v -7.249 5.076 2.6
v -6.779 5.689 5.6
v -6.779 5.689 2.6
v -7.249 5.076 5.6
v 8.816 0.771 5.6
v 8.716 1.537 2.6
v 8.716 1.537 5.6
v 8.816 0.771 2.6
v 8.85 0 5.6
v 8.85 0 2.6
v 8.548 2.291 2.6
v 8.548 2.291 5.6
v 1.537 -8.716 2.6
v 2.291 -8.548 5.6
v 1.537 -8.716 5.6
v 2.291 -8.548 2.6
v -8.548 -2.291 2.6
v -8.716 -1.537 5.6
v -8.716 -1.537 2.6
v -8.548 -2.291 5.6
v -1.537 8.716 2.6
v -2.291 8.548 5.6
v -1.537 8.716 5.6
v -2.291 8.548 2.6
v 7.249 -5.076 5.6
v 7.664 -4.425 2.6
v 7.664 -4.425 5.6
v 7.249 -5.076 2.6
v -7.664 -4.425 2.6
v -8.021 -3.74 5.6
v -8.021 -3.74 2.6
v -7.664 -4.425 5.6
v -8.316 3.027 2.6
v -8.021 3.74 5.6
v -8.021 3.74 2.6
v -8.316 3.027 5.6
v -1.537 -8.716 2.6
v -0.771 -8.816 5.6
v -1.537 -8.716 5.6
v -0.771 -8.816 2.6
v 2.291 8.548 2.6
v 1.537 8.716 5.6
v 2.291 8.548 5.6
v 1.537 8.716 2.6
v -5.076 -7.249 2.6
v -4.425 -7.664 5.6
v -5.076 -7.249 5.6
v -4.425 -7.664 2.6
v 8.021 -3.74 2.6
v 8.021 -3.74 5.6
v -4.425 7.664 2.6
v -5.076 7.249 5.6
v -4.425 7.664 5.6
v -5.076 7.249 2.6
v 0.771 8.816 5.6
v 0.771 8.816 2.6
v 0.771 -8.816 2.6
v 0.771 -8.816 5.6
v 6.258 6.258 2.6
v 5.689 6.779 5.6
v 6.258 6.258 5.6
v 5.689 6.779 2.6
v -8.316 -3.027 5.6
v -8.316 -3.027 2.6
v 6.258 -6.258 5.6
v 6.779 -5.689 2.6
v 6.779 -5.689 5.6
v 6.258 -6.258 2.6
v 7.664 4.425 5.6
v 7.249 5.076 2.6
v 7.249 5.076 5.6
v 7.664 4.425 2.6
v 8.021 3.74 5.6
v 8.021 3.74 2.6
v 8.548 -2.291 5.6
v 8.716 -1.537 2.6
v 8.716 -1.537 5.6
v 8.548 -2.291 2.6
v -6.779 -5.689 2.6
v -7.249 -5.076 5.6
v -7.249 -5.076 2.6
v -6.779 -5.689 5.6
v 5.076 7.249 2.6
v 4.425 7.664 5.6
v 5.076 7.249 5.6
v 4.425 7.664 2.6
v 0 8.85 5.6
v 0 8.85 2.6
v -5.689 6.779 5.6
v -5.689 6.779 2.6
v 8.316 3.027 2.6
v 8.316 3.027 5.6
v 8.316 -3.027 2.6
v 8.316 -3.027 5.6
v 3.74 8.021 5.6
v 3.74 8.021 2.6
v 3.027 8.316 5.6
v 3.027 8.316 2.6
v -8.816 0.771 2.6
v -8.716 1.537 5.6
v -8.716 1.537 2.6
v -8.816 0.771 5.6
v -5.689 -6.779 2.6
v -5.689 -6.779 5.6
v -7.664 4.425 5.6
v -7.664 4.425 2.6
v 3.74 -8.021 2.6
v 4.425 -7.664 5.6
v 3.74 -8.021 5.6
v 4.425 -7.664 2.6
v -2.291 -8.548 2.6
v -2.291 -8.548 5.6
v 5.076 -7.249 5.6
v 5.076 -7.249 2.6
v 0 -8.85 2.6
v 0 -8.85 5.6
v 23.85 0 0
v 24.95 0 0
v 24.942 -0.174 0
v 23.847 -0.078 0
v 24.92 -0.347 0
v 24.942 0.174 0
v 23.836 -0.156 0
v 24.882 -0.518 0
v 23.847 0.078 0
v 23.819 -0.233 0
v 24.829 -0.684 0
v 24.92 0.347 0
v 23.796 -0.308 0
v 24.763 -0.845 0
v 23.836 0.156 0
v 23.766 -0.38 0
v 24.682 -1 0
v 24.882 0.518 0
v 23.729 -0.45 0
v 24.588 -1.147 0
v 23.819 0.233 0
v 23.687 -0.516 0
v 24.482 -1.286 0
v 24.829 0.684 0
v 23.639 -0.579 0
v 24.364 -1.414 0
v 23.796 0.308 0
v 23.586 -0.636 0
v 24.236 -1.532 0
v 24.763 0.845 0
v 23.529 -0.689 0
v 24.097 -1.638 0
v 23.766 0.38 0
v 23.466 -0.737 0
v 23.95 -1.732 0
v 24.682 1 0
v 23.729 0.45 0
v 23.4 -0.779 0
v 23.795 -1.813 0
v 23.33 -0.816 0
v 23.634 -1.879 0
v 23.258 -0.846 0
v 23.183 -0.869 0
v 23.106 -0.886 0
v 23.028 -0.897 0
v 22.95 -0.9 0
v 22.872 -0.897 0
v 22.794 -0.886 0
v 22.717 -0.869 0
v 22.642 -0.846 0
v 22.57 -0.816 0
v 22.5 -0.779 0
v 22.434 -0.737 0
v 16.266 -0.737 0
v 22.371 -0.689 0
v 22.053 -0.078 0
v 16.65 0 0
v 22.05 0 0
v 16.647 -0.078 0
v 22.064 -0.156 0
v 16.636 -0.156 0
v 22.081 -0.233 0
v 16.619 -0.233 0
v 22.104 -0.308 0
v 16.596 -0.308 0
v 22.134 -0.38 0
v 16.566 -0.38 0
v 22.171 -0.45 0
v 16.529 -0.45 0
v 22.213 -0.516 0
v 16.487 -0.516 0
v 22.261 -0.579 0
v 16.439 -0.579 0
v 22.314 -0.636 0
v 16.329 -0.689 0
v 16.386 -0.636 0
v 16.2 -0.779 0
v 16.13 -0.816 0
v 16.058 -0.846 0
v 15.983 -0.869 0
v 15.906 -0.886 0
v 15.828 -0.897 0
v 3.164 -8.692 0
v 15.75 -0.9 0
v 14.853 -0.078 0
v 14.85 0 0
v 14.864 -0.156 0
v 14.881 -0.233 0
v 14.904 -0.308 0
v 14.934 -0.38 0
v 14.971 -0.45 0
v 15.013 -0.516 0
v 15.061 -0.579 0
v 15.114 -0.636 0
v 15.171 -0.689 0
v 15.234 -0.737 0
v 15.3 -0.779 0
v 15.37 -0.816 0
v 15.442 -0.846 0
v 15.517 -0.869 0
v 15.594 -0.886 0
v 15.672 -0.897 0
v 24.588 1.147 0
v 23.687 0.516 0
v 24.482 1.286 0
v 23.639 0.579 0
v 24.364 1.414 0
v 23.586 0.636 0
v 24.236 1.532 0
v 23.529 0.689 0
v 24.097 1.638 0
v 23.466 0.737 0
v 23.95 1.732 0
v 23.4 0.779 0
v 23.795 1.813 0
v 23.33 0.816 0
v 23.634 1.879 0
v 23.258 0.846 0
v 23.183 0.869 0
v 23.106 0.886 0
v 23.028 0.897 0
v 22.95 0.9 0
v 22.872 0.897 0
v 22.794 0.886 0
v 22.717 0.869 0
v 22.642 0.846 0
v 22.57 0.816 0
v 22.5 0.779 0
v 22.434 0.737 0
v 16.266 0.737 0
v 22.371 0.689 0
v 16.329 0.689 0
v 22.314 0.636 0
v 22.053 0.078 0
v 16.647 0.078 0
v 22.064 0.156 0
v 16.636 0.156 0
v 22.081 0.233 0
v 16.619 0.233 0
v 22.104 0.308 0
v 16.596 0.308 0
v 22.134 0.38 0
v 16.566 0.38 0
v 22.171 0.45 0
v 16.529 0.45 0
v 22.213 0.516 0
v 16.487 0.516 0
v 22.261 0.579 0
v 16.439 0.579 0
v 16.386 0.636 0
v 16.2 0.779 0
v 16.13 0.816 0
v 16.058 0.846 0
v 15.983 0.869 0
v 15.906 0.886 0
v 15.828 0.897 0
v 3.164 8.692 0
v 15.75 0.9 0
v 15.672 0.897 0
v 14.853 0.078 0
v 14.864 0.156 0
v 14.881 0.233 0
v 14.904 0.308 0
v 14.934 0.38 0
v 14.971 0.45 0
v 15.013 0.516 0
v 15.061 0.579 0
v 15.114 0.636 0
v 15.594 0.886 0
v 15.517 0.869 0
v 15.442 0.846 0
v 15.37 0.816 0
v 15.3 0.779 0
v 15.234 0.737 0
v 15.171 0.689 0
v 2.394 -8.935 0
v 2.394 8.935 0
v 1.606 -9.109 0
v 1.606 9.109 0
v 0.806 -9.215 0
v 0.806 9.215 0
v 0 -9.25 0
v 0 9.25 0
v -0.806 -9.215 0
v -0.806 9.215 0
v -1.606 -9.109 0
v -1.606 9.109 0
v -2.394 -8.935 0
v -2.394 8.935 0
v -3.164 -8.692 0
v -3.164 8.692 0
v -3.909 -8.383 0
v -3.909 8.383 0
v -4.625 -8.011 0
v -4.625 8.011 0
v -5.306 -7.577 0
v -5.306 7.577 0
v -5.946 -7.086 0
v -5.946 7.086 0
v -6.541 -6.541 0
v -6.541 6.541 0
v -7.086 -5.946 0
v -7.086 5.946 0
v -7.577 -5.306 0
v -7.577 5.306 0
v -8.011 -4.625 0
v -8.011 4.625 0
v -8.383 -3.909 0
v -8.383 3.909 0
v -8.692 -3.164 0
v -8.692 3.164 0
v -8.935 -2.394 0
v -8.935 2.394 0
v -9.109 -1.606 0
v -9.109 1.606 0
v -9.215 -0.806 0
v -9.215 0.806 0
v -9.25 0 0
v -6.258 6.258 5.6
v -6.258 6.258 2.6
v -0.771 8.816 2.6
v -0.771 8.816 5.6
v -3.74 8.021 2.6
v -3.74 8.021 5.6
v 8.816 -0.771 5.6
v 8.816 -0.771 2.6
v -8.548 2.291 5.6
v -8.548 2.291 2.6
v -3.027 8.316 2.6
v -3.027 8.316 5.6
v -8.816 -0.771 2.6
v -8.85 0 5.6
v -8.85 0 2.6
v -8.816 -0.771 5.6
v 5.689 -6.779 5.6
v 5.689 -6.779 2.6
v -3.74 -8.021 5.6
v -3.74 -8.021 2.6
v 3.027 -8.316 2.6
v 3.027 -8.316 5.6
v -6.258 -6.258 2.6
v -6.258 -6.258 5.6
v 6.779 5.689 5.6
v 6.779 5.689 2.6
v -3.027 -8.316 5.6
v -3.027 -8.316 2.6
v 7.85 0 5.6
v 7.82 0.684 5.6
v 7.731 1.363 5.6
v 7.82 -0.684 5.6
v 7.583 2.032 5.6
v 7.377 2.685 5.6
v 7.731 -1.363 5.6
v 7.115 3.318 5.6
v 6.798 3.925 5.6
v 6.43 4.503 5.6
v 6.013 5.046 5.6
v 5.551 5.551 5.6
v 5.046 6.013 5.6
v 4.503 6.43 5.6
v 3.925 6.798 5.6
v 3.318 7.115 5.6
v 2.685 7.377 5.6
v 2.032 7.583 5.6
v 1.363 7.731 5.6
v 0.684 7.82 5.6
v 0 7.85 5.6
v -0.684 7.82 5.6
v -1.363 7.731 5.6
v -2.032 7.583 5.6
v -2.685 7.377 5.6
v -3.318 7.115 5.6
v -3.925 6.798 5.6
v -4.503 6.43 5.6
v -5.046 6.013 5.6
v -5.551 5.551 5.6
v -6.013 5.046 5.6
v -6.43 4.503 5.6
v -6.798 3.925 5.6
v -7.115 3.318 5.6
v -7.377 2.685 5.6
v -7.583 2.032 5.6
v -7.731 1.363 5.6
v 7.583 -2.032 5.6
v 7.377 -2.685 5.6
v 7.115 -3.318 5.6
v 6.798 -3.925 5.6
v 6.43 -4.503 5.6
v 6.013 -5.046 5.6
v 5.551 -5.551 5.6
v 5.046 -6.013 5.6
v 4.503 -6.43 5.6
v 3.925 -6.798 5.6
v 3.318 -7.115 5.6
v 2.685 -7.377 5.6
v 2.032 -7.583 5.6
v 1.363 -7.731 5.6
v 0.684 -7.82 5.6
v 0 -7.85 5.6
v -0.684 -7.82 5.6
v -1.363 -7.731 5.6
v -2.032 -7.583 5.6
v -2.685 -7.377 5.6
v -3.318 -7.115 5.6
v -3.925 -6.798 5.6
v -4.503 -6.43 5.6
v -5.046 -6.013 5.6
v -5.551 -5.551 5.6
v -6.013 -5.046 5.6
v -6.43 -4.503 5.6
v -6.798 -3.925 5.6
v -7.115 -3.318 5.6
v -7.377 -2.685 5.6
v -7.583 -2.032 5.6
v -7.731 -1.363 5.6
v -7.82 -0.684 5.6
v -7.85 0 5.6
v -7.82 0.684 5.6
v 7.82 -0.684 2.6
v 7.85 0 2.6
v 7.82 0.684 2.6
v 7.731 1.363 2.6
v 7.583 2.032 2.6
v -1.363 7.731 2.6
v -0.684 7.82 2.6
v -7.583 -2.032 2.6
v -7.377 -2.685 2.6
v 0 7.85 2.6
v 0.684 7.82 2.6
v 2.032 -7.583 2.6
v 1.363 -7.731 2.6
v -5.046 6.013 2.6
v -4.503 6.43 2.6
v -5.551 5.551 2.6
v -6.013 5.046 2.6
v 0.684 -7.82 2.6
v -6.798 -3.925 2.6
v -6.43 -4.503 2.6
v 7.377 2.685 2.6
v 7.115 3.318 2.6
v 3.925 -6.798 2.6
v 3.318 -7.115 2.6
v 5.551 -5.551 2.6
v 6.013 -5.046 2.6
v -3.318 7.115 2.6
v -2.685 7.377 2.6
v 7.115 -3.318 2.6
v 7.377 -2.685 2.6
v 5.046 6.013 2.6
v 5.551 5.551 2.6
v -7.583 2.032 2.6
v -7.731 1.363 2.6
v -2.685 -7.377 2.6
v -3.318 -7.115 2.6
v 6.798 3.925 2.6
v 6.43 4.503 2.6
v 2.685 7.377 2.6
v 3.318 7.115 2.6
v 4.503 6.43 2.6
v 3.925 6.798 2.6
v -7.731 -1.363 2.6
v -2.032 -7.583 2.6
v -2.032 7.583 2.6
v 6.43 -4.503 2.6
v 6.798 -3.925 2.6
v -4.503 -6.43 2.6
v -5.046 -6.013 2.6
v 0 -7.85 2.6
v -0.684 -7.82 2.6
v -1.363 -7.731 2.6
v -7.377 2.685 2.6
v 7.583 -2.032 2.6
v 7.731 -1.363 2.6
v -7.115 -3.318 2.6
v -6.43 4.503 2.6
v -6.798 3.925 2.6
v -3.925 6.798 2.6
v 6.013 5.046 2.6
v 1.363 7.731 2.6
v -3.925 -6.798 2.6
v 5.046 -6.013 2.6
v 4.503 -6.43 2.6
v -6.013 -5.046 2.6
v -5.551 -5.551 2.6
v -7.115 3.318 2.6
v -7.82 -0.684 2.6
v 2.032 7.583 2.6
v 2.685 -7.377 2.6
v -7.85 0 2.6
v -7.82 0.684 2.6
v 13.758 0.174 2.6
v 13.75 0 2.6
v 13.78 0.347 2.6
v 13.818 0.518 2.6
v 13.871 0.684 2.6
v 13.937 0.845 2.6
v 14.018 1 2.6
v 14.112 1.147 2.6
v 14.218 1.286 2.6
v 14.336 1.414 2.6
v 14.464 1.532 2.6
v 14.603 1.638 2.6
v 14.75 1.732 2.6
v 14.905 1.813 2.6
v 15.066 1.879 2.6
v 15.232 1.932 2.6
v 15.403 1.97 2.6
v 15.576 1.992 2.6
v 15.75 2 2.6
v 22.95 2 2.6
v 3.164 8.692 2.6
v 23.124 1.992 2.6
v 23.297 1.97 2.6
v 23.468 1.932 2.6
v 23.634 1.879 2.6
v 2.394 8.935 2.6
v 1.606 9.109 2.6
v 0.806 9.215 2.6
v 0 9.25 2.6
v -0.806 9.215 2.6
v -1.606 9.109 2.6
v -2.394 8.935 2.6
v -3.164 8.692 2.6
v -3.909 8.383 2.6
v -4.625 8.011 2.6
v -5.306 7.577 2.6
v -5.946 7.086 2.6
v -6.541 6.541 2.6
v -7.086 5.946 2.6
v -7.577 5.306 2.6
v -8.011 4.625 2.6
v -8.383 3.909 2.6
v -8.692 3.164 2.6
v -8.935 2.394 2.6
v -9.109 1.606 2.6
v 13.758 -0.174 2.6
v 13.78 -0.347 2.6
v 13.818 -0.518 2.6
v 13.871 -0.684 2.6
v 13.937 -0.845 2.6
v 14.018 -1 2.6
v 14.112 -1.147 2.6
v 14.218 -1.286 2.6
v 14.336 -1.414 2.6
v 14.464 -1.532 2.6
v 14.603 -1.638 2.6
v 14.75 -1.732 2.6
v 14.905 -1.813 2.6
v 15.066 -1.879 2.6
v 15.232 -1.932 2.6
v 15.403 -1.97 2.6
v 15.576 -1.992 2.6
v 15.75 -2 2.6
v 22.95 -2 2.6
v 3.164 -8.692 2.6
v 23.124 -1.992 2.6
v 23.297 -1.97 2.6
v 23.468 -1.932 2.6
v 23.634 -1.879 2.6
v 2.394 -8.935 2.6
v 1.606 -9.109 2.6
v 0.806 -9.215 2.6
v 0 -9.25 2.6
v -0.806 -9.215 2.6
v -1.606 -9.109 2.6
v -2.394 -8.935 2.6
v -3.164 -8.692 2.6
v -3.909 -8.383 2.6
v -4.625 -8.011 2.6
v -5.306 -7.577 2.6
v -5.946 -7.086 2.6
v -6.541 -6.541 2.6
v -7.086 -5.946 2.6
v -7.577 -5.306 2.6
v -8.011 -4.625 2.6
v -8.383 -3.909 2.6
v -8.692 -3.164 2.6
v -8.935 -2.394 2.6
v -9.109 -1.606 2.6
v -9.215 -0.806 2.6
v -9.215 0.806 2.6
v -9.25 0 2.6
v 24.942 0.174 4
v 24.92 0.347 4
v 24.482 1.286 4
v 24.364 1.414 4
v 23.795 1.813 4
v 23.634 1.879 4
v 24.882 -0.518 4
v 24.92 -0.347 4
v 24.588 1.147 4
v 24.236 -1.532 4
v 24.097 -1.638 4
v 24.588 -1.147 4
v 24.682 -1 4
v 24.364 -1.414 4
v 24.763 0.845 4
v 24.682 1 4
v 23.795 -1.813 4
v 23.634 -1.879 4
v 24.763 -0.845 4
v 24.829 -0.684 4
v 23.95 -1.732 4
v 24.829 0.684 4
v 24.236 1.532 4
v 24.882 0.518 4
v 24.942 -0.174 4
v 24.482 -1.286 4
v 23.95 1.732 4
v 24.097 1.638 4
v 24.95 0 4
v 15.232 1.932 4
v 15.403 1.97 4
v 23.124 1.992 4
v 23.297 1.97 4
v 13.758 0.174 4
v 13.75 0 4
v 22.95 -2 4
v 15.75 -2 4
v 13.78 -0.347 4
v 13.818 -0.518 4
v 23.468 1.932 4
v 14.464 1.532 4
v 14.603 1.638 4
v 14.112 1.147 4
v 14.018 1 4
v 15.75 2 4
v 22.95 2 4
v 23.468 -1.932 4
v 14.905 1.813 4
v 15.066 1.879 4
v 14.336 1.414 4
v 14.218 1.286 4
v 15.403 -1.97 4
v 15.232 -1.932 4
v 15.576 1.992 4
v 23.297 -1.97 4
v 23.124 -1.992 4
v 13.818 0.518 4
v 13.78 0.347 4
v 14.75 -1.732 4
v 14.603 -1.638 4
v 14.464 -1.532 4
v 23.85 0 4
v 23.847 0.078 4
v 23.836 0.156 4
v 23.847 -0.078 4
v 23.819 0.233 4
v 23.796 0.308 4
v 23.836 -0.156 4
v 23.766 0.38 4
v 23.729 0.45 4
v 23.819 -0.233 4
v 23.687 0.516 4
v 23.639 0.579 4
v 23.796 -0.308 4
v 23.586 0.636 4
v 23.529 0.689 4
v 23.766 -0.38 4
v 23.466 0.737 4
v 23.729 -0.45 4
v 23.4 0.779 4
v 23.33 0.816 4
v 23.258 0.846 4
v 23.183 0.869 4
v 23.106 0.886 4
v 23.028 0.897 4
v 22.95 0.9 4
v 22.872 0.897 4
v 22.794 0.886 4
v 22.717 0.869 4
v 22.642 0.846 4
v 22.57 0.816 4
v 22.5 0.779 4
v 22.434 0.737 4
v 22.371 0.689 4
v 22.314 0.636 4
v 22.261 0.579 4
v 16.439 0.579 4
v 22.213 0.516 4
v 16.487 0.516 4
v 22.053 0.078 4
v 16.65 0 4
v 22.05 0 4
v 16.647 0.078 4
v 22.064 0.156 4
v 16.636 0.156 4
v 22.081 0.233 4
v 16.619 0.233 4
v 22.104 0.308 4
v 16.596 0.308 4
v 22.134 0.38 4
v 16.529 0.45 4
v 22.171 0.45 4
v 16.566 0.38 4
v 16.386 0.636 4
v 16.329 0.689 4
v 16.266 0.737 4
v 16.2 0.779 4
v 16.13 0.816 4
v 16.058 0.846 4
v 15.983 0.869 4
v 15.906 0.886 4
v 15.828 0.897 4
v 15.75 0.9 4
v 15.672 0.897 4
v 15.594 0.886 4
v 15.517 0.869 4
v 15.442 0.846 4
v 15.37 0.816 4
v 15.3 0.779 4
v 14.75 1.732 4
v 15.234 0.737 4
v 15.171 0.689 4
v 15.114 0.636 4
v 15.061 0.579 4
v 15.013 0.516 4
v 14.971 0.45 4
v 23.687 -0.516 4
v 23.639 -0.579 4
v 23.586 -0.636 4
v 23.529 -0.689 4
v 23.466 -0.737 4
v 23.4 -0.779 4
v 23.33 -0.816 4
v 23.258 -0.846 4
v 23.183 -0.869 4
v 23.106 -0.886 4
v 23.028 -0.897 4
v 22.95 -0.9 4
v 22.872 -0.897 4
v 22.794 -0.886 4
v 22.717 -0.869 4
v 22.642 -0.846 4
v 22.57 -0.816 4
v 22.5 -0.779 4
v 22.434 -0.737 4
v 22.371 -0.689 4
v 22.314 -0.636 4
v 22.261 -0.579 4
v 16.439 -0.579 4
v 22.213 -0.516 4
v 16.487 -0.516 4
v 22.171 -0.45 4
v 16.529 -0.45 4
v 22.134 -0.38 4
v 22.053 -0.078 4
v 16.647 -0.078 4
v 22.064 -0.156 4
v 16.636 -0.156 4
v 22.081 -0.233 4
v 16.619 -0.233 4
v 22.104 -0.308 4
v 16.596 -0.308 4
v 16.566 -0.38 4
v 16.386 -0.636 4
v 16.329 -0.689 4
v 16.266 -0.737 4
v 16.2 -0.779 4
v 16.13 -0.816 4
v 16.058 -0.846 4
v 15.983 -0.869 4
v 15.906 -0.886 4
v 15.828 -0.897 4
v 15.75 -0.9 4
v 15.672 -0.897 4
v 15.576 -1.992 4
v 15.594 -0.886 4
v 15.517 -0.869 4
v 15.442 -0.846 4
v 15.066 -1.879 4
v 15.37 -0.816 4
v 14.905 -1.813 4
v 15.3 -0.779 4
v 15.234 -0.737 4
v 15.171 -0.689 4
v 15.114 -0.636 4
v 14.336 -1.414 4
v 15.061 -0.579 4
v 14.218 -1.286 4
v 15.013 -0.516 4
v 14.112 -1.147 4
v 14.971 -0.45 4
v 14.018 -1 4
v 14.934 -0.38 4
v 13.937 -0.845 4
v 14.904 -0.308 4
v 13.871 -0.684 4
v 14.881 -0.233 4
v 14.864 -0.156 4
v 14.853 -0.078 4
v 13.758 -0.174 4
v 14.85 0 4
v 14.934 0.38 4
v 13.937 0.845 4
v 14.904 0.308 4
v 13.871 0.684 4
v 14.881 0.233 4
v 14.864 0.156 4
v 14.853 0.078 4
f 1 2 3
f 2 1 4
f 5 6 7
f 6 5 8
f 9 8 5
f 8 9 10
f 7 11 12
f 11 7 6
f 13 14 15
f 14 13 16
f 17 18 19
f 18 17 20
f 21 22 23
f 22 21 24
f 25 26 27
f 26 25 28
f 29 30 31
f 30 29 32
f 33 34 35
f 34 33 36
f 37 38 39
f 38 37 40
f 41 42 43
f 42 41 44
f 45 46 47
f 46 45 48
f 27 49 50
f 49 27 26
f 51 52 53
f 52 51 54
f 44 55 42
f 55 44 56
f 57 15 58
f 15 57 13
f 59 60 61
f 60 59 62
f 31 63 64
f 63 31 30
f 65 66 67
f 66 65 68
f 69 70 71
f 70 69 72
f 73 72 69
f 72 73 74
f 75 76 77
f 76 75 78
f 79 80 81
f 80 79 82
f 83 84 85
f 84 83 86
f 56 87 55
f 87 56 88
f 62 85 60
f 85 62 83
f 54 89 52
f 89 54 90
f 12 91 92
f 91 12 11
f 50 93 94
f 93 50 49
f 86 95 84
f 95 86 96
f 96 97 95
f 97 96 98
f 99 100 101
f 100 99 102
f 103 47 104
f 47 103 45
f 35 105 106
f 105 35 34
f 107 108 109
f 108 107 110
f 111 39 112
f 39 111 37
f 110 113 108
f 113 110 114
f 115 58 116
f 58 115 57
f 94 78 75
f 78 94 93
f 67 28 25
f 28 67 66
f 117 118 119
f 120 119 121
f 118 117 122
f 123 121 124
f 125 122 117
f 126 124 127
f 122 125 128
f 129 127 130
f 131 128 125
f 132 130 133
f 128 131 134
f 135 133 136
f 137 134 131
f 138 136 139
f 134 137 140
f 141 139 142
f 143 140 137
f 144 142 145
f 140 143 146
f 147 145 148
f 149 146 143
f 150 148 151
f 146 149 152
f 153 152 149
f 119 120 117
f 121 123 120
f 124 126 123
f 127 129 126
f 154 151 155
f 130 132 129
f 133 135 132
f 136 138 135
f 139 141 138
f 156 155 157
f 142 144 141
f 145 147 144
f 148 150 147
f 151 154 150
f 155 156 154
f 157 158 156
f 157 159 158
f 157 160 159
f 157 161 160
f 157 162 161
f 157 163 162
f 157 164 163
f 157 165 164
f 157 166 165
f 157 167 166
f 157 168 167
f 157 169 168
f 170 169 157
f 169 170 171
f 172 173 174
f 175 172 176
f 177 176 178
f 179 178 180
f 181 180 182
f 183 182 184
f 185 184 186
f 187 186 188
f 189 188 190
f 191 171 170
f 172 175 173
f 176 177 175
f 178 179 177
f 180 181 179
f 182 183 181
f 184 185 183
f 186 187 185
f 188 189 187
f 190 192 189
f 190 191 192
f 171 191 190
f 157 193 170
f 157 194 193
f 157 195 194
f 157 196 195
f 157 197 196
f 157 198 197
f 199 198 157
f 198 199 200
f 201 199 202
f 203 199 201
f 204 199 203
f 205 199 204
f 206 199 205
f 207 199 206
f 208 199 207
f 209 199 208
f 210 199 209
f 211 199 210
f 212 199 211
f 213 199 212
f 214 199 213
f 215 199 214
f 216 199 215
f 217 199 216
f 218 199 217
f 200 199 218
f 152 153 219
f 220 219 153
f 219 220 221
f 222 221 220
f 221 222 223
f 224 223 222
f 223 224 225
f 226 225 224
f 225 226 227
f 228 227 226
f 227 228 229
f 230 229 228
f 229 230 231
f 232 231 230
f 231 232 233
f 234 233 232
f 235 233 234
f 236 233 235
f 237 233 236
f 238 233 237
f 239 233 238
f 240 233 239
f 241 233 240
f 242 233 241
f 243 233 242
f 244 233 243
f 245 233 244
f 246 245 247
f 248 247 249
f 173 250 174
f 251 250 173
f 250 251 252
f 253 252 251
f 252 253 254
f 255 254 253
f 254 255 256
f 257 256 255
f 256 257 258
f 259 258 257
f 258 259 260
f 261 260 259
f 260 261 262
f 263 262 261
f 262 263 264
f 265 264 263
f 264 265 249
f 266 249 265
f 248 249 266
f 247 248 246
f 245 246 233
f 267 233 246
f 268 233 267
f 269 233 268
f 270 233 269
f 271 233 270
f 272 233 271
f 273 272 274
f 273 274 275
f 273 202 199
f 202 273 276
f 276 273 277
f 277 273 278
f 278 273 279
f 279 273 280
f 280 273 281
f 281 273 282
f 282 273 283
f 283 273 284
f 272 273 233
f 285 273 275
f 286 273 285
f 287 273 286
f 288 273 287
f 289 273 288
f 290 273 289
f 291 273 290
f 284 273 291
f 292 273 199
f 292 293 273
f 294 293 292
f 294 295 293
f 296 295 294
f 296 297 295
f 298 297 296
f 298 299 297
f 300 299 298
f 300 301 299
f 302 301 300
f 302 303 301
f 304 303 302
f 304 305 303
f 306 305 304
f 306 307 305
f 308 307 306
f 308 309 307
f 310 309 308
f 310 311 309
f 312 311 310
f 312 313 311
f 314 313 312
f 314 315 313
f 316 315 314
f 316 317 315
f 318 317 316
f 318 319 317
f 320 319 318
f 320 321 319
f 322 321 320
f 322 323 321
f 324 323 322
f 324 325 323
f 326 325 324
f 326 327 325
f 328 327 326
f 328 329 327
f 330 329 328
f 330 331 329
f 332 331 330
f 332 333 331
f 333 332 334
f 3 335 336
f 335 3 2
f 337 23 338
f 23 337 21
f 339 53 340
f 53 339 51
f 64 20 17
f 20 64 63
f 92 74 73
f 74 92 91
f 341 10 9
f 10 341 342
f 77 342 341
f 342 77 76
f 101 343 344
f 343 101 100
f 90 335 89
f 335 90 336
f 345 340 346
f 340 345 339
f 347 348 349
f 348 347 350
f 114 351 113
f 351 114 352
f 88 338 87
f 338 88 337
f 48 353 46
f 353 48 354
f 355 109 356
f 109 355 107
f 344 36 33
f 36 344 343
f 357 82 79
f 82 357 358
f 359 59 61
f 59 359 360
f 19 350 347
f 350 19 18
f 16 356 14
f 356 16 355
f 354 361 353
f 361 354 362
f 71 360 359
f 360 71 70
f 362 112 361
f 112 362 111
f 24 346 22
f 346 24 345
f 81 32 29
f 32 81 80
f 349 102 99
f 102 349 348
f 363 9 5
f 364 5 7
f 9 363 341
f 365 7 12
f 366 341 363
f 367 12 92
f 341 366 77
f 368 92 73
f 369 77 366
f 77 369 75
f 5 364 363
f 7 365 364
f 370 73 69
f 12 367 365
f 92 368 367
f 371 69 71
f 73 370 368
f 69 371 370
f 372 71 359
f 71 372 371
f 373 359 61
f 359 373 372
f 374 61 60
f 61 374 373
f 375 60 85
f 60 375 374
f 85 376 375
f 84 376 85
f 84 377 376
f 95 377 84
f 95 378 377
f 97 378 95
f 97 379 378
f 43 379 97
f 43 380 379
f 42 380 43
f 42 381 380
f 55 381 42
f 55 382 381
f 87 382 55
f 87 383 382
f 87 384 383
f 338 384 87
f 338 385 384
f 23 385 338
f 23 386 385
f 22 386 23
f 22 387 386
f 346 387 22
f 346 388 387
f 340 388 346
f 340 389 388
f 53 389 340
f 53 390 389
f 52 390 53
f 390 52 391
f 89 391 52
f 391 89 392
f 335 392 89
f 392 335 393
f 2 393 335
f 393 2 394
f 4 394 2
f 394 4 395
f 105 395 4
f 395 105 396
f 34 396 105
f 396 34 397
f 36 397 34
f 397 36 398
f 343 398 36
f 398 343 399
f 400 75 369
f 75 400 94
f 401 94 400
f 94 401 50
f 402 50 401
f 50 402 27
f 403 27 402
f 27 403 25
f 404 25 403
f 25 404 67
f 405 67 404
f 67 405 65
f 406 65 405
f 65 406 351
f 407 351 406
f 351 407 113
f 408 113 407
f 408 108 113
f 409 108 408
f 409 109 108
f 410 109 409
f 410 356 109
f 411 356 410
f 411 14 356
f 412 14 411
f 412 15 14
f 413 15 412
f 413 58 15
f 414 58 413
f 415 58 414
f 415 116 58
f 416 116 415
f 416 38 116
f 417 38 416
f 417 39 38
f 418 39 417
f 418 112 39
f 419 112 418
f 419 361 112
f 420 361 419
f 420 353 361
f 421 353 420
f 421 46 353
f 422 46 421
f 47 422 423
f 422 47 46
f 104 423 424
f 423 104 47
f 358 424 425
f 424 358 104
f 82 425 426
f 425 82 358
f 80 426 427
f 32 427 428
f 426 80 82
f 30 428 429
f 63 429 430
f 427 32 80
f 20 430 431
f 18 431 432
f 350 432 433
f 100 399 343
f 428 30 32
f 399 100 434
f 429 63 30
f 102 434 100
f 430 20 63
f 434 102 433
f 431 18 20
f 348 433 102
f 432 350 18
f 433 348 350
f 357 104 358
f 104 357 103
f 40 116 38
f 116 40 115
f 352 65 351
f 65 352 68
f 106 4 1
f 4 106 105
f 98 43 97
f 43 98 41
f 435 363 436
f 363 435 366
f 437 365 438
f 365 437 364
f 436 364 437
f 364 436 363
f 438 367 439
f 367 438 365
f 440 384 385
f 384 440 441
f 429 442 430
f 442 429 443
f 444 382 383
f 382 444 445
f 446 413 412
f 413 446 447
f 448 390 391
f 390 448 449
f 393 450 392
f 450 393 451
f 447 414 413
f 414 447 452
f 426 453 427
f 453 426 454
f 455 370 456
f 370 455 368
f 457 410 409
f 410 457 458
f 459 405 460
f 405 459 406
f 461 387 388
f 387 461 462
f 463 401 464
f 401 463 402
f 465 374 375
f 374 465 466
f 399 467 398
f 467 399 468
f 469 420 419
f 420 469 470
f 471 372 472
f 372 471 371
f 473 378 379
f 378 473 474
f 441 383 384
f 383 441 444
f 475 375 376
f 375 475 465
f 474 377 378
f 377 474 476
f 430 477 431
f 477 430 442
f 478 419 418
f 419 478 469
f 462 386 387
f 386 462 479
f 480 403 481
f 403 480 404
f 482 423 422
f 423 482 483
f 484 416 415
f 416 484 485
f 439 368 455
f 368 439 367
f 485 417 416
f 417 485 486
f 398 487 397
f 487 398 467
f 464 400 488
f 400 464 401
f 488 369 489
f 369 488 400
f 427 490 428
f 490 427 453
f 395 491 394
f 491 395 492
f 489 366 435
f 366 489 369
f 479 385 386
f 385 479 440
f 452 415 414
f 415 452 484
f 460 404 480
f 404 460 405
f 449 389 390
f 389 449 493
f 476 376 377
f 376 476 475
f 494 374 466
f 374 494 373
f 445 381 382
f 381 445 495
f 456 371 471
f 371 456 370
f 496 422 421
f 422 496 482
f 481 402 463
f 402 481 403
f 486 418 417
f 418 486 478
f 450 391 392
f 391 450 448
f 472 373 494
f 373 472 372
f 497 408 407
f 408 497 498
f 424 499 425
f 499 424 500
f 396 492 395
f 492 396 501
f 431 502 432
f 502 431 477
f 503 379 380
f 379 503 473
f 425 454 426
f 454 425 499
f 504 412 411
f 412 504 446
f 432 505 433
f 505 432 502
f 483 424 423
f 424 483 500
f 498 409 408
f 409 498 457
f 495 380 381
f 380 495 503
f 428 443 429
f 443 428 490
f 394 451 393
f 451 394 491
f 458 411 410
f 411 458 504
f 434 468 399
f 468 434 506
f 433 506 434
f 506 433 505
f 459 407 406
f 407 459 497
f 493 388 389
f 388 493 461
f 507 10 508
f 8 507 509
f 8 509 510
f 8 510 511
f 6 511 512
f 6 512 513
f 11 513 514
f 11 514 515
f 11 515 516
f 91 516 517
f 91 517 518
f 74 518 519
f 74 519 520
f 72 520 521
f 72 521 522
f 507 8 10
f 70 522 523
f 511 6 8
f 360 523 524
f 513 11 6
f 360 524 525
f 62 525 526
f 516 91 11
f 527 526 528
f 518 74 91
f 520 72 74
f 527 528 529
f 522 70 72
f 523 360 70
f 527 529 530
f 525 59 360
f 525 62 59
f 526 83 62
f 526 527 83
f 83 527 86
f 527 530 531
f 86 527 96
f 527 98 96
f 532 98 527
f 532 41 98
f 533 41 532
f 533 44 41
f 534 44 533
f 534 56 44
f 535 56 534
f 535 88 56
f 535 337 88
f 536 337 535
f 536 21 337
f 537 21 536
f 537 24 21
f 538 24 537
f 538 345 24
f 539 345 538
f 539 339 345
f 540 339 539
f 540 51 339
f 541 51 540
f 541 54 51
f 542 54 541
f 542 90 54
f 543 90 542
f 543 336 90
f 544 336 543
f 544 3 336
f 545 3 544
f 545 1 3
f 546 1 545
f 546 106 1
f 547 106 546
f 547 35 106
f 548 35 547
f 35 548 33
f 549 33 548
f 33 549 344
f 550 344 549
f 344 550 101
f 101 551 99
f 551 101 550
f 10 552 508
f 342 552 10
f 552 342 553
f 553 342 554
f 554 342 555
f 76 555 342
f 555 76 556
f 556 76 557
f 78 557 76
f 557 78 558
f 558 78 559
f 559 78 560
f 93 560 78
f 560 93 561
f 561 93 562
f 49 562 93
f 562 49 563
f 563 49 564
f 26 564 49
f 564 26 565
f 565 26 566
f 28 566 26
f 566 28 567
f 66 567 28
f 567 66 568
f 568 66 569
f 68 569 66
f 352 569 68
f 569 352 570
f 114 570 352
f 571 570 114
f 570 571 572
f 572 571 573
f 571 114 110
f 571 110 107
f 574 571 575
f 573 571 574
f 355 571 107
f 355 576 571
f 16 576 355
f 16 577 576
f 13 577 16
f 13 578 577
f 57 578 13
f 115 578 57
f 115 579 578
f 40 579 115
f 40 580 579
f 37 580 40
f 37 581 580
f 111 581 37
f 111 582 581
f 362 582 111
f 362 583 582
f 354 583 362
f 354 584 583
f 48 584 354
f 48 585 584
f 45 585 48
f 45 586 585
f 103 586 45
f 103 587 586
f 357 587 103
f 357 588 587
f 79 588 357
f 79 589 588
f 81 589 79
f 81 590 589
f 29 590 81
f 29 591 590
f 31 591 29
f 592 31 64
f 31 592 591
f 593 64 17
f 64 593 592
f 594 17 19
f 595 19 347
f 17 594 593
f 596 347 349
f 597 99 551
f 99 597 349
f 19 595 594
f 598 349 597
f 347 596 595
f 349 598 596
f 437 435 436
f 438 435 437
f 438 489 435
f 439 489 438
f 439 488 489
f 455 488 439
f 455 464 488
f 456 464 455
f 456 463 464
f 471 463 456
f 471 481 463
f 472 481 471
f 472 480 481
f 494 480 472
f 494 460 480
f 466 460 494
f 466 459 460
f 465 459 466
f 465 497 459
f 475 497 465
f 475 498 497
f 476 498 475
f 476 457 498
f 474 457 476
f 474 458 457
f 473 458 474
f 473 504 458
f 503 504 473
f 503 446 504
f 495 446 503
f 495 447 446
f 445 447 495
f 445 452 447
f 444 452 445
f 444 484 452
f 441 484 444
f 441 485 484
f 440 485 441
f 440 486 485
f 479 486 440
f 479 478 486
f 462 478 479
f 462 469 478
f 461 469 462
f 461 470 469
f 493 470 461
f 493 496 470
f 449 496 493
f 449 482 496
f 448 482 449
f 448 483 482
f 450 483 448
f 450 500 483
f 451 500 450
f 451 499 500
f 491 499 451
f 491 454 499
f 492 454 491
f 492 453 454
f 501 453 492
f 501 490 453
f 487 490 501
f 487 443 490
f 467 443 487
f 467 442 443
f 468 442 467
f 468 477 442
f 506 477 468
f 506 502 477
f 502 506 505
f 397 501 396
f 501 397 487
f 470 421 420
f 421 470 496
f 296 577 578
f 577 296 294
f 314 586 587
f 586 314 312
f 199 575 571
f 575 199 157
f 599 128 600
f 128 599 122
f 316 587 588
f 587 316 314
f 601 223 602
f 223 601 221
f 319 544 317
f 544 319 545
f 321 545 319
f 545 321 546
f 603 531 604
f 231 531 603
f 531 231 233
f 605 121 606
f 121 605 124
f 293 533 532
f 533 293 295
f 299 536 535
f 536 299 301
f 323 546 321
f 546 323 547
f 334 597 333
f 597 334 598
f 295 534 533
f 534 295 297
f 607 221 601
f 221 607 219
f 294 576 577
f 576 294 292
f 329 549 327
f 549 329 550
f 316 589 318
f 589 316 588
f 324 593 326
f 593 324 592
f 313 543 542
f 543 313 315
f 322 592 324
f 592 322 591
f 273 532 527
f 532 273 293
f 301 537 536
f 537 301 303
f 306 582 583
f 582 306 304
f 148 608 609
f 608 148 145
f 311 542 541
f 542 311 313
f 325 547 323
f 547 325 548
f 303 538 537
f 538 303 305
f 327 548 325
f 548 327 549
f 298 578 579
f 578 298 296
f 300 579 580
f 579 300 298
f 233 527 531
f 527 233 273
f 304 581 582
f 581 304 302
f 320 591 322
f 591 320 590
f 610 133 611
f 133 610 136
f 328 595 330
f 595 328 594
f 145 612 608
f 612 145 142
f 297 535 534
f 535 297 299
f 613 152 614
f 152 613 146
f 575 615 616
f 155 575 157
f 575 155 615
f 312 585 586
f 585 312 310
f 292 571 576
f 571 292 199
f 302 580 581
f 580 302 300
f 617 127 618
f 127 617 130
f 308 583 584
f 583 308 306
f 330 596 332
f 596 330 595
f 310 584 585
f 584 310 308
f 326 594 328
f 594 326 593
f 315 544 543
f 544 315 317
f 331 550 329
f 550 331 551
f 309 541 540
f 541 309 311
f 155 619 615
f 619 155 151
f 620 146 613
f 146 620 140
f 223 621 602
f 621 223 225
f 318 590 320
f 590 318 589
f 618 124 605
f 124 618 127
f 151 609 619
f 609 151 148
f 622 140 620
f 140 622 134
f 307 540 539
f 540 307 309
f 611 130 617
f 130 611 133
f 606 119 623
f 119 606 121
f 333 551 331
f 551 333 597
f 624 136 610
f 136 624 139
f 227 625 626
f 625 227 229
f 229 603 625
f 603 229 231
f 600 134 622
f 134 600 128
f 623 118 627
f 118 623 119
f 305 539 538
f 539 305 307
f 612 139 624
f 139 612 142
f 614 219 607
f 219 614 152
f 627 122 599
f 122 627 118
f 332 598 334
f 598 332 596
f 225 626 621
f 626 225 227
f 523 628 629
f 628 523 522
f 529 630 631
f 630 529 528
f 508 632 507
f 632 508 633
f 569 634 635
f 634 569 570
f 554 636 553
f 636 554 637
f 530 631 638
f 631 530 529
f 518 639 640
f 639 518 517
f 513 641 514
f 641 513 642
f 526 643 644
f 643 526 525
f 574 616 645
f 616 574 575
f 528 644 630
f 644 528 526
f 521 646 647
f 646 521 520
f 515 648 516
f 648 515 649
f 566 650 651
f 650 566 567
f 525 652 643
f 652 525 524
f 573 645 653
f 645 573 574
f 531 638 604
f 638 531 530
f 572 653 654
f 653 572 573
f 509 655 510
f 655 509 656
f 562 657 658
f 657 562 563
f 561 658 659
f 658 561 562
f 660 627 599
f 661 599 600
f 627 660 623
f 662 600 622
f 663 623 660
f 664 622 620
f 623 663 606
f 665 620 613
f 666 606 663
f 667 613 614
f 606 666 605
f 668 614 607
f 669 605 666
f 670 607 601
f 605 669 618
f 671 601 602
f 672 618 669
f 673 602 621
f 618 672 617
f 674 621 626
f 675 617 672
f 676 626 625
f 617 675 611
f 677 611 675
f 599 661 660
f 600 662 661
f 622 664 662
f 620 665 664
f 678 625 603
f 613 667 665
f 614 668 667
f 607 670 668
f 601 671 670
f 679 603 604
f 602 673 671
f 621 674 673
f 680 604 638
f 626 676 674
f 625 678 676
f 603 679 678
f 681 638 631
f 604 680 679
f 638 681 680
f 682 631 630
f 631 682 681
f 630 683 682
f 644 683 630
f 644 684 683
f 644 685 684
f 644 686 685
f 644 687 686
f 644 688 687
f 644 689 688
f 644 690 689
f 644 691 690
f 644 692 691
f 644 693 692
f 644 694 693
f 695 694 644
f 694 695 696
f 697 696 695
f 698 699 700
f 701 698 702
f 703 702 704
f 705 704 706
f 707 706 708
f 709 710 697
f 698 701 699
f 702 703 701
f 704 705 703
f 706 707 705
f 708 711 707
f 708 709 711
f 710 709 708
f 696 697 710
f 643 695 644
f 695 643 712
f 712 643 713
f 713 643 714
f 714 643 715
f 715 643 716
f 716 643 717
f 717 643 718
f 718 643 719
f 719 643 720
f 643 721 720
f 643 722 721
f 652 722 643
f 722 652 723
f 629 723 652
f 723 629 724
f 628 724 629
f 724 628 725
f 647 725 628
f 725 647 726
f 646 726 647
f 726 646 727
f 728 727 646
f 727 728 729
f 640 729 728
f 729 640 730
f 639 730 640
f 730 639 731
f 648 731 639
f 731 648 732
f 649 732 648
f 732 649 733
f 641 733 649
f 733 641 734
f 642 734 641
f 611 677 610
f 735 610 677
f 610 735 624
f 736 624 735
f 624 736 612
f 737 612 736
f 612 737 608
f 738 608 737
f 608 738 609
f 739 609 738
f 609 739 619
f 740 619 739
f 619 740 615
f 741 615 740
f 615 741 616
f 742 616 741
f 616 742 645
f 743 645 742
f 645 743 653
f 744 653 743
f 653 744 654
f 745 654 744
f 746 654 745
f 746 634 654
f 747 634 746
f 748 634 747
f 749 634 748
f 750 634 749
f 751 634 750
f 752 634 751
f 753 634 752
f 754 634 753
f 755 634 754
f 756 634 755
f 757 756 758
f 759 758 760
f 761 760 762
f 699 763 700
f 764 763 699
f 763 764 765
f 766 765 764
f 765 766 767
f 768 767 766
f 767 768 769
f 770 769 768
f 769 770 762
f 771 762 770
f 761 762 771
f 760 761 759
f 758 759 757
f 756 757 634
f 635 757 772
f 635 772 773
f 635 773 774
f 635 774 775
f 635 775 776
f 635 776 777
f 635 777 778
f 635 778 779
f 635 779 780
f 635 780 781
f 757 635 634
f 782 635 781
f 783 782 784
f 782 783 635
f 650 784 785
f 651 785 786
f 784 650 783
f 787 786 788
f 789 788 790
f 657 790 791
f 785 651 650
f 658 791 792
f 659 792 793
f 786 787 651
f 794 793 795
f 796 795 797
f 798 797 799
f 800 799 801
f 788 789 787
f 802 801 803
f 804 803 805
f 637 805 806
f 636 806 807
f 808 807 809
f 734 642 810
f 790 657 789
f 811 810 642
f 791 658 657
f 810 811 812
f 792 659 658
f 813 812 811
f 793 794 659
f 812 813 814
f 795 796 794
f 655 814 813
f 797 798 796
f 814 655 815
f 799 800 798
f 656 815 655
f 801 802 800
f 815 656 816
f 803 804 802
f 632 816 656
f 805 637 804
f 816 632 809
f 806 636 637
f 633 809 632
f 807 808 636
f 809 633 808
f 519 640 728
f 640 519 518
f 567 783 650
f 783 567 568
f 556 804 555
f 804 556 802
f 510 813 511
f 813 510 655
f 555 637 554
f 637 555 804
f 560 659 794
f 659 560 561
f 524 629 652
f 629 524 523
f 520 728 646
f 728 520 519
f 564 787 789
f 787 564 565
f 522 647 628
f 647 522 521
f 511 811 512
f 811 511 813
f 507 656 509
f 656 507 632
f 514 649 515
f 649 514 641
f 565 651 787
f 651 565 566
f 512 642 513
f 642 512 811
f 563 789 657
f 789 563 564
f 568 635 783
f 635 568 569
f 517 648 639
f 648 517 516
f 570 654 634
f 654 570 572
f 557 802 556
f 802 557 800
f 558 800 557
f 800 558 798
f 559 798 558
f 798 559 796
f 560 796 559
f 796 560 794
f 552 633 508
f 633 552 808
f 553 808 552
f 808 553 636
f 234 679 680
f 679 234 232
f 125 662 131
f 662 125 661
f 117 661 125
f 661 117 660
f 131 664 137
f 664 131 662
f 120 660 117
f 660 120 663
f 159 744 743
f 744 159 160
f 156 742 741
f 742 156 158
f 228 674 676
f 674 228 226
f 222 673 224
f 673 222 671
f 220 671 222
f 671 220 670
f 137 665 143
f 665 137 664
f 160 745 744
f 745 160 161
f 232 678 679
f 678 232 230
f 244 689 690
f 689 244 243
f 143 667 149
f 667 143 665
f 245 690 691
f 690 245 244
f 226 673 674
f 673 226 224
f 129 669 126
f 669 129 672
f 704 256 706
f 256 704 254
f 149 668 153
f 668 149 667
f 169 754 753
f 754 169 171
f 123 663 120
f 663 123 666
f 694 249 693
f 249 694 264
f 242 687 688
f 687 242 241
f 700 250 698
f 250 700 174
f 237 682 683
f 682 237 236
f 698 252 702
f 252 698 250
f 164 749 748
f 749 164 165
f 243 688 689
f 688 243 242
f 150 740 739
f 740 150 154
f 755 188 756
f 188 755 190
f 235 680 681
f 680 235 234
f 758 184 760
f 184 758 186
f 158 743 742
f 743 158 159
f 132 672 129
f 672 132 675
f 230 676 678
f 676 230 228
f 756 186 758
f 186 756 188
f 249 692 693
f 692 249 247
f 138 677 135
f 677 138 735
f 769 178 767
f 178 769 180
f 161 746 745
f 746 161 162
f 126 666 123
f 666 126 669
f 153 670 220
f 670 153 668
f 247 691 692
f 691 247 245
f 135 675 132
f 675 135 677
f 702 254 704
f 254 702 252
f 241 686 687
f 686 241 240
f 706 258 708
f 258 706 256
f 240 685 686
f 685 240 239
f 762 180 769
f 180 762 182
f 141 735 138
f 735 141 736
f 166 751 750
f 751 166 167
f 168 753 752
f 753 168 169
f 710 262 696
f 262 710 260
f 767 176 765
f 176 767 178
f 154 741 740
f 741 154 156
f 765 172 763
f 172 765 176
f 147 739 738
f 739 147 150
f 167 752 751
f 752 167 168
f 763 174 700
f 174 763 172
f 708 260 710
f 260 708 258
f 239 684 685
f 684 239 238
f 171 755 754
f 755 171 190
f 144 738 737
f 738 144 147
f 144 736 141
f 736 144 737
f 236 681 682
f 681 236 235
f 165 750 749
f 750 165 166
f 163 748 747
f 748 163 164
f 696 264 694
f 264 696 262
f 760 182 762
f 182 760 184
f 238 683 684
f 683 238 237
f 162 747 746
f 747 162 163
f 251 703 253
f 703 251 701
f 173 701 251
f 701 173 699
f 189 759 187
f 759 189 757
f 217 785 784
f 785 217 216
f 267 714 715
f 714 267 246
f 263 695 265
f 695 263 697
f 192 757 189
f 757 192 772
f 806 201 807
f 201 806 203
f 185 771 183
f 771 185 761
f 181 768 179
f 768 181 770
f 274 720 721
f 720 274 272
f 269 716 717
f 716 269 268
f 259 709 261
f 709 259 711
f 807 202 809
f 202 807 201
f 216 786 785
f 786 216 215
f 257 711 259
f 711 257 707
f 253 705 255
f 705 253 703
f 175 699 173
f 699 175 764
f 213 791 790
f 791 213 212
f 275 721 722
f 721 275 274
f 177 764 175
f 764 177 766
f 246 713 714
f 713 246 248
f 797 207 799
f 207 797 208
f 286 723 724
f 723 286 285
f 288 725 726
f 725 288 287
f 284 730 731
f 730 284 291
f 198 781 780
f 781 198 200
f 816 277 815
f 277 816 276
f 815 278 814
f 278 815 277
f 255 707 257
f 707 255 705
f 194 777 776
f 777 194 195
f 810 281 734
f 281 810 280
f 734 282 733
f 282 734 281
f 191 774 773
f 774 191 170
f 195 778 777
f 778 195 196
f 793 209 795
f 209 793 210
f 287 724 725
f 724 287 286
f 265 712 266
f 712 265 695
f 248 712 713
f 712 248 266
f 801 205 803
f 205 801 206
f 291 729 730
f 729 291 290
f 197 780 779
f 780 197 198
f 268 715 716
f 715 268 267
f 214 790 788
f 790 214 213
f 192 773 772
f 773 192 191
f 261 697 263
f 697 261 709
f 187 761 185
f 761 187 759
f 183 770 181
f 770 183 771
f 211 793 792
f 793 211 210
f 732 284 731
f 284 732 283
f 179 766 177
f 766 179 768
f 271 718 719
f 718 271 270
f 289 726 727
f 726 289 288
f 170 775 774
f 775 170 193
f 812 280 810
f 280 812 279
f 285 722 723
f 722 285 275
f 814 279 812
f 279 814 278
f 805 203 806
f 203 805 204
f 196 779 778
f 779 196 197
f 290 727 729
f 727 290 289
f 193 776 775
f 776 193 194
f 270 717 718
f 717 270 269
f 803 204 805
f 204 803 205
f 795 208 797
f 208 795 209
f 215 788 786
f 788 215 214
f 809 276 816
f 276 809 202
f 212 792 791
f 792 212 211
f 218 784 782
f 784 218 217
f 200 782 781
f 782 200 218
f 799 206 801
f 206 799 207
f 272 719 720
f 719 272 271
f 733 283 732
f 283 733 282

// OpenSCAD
// This is a replacement weight holder for a sonic shaking ghost toy.
//
// There were several different designs over generations of the toy,
// and this copies one of them, but should work for the ones that
// have a weight sitting in a cup.
//
// You will probably need to drill out the holes for a good fit.
// I found a 5/16 inch drill bit was about right.
//
// You'll need to glue an approximately 9 gram weight into the cup.

base_h = 2.6; // thickness of the main part
base_l = 34.2; // how long the part is in its longest dimension
big_d = 18.5; // diameter of the big circle at one end
small_d = 4; // diameter of the small circle at the other end

cup_od = 17.7; // outer diameter of the cup that holds the weight
cup_h = 5.6; // total height (including base plate) of the cup
cup_id = cup_od - 2; // inner diameter of the recess where weight sits

support_h = 4; // total height (including base) of the extra support ridge
support_d = 4; // width of the extra support ridge

hole1_x = base_l - 0.5*(big_d + small_d); // location of the first hole
hole2_offset = 7.2; // distance between the two holes
hole2_x = hole1_x - hole2_offset;

hole_d = 1.8; // diameter of the holes

$fn=72;
difference() {
  union() {
    hull() {
      cylinder(h=base_h, d=18.5);
      translate([hole1_x,0,0]) cylinder(h=base_h, d=4);
    }
    difference() {
      cylinder(h=cup_h, d=cup_od);
      translate([0,0,base_h]) cylinder(h=cup_h, d=cup_id);
    }
    hull() {
      translate([hole1_x,0,0]) cylinder(h=support_h, d=support_d);
      translate([hole2_x,0,0]) cylinder(h=support_h, d=support_d);
    }
  };
  translate([hole1_x,0,0]) cylinder(h=support_h, d=hole_d);
  translate([hole2_x,0,0]) cylinder(h=support_h, d=hole_d);
}
